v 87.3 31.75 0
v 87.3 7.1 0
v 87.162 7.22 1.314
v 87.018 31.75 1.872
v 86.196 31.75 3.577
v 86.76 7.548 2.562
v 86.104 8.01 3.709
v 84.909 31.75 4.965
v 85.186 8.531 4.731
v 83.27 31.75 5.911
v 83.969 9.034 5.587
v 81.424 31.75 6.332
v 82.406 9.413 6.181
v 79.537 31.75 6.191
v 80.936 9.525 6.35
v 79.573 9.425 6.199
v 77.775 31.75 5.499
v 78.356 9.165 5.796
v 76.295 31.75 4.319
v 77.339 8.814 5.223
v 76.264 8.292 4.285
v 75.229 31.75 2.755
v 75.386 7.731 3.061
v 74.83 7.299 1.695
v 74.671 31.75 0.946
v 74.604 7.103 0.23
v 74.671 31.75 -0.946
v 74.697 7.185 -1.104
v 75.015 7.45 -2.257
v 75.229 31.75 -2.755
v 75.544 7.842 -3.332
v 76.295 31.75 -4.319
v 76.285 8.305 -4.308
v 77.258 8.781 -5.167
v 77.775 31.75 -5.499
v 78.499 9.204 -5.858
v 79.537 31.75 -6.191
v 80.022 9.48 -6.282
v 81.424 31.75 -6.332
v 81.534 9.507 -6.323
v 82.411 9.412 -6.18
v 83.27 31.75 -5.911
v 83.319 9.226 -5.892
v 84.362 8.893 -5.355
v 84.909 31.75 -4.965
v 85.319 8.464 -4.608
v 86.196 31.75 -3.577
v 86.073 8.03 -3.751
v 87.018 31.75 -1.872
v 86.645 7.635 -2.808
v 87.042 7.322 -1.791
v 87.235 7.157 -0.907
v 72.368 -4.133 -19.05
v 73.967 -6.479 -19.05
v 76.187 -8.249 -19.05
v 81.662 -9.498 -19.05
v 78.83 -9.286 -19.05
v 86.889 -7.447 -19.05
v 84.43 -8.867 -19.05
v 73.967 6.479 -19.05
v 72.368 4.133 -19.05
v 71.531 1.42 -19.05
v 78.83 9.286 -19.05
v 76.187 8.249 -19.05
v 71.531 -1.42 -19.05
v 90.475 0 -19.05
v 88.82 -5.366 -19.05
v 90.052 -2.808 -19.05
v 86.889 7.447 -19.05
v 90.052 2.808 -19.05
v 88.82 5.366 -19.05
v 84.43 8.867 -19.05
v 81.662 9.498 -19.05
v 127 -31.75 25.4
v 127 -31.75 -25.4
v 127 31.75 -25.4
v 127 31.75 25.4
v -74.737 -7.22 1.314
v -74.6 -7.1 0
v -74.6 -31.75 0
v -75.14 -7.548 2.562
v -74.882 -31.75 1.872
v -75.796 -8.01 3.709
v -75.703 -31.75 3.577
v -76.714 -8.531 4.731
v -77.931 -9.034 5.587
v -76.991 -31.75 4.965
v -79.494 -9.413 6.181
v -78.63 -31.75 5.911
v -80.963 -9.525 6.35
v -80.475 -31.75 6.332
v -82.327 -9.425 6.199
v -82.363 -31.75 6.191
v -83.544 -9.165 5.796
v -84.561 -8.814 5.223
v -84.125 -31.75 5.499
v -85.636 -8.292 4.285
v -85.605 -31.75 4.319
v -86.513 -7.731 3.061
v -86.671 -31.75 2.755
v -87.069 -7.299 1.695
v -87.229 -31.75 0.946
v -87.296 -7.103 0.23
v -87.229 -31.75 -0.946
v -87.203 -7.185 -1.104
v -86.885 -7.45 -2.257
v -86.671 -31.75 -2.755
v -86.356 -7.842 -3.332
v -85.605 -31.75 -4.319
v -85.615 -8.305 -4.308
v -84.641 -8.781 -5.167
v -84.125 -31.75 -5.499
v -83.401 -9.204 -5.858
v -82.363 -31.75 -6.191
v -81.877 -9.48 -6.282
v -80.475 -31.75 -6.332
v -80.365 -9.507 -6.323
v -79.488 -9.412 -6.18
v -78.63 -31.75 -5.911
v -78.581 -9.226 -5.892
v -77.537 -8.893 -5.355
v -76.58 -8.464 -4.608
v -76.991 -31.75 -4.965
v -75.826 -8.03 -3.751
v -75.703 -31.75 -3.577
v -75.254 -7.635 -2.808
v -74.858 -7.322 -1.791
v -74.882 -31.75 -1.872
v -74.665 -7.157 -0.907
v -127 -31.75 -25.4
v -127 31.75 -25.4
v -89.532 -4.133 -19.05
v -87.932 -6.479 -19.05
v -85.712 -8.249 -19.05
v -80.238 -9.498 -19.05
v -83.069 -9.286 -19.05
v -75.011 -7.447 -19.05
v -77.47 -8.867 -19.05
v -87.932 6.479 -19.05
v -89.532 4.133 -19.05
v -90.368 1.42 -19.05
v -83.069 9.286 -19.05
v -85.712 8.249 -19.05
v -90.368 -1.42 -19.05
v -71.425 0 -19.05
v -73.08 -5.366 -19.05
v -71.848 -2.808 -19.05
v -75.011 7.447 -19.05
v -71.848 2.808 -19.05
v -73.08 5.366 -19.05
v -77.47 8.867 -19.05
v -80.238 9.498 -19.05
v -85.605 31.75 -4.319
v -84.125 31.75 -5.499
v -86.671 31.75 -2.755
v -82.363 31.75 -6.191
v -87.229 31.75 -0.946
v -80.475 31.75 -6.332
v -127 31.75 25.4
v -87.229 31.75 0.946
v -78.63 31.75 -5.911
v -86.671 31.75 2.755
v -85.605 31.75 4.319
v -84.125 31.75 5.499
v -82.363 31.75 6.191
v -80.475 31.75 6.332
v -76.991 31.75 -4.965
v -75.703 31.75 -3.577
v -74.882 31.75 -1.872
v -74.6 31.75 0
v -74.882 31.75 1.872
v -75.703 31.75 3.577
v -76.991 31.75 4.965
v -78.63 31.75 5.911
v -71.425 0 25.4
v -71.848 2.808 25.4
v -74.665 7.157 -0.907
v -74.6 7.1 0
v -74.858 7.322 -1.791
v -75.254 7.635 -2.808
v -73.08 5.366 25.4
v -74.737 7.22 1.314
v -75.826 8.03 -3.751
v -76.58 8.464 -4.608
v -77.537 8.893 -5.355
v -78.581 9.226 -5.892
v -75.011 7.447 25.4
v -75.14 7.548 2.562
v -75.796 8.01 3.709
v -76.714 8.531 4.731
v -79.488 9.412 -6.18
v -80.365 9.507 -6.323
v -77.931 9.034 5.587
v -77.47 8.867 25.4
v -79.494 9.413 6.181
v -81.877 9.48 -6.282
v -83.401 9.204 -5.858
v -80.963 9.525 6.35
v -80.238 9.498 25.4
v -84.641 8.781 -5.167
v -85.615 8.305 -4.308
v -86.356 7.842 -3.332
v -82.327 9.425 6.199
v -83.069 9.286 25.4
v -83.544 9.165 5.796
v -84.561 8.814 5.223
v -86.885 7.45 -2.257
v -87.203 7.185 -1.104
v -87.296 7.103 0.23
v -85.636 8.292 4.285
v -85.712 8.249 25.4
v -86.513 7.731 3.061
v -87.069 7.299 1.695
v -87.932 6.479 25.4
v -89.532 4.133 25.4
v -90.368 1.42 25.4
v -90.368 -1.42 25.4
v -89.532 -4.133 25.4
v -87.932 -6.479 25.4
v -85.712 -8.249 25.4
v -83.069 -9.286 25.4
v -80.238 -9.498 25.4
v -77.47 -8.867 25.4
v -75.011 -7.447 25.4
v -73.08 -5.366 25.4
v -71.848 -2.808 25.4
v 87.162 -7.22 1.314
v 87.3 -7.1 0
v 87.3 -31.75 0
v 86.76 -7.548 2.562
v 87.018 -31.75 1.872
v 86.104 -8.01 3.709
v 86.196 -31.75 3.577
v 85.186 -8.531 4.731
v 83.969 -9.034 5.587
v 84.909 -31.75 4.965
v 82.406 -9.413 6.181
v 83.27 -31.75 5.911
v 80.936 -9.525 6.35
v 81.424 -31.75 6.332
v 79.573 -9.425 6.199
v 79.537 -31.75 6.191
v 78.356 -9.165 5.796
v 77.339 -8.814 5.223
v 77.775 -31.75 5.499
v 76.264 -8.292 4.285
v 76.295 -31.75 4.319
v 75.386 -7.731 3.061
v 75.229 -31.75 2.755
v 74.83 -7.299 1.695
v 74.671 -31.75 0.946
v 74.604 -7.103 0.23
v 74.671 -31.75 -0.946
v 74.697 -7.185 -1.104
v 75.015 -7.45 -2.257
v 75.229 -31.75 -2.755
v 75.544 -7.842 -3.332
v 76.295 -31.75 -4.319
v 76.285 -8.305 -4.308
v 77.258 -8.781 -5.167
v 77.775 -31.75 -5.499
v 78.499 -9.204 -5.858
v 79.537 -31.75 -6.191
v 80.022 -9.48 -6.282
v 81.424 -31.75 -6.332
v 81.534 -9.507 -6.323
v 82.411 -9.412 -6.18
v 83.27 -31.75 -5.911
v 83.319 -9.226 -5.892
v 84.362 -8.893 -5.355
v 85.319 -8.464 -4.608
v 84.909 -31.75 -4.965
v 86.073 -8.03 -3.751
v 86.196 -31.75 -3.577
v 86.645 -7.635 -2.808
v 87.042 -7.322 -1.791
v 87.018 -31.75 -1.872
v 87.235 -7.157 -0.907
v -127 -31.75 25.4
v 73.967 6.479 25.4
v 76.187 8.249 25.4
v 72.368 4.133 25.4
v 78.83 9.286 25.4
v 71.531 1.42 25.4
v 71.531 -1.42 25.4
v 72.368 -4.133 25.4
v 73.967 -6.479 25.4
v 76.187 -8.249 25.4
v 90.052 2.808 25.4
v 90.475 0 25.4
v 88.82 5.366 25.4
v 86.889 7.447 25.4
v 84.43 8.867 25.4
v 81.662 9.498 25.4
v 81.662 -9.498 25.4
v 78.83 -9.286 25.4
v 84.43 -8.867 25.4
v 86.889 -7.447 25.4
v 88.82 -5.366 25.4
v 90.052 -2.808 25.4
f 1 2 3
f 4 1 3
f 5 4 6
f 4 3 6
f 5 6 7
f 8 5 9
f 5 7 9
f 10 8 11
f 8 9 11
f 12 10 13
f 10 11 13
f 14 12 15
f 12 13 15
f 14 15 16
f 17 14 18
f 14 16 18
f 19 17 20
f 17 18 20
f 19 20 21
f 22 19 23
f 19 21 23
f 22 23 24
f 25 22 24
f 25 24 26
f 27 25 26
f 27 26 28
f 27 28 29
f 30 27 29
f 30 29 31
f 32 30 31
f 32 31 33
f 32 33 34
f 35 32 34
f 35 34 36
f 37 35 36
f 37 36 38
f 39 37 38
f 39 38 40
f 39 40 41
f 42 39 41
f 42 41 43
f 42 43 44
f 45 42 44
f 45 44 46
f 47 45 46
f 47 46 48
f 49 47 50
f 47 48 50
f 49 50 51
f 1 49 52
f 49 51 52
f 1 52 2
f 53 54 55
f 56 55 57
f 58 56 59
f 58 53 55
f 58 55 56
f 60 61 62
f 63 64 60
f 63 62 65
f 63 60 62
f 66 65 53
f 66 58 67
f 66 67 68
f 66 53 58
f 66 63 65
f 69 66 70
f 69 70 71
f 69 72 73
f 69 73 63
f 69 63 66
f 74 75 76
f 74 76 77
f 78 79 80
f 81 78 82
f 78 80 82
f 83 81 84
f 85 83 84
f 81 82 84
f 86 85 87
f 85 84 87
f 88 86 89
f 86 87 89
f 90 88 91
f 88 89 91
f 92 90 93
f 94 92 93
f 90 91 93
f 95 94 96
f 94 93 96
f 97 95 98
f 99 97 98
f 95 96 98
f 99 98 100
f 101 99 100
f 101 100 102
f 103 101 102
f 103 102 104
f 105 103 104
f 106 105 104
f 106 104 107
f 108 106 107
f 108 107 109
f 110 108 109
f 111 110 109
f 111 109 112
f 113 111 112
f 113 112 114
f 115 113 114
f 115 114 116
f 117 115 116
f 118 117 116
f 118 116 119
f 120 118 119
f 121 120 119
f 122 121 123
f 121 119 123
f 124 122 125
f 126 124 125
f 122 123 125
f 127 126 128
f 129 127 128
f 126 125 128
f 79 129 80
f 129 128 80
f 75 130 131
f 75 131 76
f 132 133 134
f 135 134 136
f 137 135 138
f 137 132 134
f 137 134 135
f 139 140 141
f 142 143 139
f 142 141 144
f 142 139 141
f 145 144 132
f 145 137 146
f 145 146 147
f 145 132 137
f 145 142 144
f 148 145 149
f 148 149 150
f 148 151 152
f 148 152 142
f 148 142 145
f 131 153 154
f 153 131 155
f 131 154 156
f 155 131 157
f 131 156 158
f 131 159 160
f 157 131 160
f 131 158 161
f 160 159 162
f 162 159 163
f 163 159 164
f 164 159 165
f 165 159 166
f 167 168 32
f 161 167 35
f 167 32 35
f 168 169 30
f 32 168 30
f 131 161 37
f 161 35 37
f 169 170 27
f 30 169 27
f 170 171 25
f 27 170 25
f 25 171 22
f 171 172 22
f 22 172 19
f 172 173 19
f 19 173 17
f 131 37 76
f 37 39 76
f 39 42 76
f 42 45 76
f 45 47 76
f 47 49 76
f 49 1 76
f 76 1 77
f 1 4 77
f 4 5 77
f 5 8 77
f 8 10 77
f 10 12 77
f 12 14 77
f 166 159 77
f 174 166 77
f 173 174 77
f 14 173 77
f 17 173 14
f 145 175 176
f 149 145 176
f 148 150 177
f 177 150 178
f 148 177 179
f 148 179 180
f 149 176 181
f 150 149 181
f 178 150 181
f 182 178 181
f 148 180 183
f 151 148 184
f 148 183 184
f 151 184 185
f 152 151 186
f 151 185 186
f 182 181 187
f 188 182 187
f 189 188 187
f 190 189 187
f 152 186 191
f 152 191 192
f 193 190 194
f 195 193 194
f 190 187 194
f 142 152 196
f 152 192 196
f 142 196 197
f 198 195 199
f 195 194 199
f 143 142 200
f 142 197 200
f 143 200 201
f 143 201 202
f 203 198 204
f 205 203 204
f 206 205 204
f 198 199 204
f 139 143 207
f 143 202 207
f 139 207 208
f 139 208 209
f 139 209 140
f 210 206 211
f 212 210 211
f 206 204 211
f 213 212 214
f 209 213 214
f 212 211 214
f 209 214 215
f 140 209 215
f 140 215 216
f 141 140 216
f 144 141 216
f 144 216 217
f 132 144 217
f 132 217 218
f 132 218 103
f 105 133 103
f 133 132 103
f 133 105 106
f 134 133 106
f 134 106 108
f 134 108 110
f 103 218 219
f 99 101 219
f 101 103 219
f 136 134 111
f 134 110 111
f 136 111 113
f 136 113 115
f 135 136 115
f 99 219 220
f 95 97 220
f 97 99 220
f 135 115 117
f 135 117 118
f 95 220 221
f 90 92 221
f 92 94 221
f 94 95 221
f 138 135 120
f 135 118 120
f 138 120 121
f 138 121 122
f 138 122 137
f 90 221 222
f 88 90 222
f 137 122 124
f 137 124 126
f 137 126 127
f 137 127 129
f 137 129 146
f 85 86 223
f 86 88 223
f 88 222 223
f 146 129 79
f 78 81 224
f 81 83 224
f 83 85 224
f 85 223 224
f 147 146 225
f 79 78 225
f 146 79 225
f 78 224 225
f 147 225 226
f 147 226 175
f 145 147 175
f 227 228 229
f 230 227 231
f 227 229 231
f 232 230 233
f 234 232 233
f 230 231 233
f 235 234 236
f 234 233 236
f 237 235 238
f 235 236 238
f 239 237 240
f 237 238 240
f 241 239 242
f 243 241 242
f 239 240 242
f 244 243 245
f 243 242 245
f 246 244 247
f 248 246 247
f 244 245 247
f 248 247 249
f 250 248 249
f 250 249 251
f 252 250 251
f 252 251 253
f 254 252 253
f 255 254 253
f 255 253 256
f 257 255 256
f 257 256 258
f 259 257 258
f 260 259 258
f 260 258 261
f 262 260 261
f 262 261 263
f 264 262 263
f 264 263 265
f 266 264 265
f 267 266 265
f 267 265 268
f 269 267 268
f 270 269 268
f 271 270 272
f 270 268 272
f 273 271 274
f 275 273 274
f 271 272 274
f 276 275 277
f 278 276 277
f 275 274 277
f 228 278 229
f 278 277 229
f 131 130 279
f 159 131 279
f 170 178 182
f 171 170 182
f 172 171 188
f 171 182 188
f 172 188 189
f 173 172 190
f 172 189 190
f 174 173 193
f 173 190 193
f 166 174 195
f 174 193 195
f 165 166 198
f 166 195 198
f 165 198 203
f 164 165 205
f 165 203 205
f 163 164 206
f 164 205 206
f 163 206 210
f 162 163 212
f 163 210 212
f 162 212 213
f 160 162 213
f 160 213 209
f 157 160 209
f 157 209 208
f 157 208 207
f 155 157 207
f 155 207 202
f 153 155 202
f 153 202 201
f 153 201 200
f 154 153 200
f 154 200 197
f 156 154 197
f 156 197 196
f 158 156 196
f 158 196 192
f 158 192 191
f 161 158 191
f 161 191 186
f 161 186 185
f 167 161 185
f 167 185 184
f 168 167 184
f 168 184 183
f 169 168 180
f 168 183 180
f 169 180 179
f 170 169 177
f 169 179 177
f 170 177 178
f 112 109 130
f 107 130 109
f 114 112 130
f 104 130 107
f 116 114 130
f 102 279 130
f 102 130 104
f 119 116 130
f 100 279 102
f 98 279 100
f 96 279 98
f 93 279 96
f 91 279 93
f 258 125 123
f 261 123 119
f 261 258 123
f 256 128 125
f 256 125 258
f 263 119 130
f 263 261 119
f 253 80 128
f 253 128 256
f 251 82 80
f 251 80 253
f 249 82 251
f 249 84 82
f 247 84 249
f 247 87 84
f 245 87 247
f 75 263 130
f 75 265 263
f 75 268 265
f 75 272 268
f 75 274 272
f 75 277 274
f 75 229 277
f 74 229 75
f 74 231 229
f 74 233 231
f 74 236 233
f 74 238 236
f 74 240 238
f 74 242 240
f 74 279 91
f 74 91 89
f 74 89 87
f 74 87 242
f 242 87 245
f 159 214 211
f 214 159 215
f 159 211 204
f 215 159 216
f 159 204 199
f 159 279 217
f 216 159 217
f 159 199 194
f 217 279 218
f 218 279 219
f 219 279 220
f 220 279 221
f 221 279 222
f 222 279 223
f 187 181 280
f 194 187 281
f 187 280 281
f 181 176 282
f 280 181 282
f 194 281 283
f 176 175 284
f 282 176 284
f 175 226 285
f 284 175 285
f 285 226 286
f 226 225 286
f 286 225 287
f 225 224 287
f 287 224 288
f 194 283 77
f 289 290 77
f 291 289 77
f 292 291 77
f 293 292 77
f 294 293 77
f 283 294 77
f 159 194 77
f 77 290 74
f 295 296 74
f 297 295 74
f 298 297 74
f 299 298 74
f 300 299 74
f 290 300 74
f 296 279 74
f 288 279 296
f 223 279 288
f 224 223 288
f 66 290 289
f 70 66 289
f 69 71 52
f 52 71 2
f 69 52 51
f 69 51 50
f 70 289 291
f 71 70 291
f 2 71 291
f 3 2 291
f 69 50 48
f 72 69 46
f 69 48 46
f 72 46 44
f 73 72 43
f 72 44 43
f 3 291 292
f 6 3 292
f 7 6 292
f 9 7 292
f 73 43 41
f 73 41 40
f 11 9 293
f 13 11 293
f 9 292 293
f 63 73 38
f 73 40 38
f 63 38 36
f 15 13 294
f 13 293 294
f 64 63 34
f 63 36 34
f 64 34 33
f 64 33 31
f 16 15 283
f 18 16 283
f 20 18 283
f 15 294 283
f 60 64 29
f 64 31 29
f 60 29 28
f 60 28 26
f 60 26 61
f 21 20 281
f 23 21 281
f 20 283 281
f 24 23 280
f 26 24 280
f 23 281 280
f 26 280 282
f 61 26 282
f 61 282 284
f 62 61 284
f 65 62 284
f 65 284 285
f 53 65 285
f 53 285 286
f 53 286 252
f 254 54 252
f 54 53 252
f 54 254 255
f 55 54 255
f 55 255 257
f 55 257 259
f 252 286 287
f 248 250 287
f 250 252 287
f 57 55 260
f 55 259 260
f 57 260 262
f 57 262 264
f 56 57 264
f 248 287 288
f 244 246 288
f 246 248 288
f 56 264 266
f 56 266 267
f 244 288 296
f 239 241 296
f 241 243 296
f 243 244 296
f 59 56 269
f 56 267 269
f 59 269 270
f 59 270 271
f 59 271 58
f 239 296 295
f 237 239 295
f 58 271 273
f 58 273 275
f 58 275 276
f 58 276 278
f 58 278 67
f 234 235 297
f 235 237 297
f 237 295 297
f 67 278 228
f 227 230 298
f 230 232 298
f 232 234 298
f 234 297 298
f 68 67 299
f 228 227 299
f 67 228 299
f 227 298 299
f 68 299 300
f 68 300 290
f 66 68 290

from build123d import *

# Parameters (mm, degrees)
F0_W     = 254
F0_H     = 50.8
F1_DEPTH = 31.75
F2_R     = 9.525
F3_DEPTH = 44.45
F4_R     = 6.35
F5_DEPTH = 63.501


with BuildPart() as f1:
    # F0 (on Front) → F1 (new body, symmetric)
    with BuildSketch(Plane.XZ):
        Rectangle(F0_W, F0_H)
    extrude(amount=F1_DEPTH, both=True)

    # F2 (on face) → F3 (cut)
    with BuildSketch(Plane.XY.offset(25.4)):
        with Locations((-80.9498, 0)):
            Circle(F2_R)
        with Locations((80.9498, 0)):
            Circle(F2_R)
    extrude(amount=-F3_DEPTH, mode=Mode.SUBTRACT)

    # F4 (on face) → F5 (cut, through all)
    with BuildSketch(Plane.XZ.offset(31.75)):
        with Locations((-80.9498, 0)):
            Circle(F4_R)
        with Locations((80.9498, 0)):
            Circle(F4_R)
    extrude(amount=-F5_DEPTH, mode=Mode.SUBTRACT)


solid = f1.part
